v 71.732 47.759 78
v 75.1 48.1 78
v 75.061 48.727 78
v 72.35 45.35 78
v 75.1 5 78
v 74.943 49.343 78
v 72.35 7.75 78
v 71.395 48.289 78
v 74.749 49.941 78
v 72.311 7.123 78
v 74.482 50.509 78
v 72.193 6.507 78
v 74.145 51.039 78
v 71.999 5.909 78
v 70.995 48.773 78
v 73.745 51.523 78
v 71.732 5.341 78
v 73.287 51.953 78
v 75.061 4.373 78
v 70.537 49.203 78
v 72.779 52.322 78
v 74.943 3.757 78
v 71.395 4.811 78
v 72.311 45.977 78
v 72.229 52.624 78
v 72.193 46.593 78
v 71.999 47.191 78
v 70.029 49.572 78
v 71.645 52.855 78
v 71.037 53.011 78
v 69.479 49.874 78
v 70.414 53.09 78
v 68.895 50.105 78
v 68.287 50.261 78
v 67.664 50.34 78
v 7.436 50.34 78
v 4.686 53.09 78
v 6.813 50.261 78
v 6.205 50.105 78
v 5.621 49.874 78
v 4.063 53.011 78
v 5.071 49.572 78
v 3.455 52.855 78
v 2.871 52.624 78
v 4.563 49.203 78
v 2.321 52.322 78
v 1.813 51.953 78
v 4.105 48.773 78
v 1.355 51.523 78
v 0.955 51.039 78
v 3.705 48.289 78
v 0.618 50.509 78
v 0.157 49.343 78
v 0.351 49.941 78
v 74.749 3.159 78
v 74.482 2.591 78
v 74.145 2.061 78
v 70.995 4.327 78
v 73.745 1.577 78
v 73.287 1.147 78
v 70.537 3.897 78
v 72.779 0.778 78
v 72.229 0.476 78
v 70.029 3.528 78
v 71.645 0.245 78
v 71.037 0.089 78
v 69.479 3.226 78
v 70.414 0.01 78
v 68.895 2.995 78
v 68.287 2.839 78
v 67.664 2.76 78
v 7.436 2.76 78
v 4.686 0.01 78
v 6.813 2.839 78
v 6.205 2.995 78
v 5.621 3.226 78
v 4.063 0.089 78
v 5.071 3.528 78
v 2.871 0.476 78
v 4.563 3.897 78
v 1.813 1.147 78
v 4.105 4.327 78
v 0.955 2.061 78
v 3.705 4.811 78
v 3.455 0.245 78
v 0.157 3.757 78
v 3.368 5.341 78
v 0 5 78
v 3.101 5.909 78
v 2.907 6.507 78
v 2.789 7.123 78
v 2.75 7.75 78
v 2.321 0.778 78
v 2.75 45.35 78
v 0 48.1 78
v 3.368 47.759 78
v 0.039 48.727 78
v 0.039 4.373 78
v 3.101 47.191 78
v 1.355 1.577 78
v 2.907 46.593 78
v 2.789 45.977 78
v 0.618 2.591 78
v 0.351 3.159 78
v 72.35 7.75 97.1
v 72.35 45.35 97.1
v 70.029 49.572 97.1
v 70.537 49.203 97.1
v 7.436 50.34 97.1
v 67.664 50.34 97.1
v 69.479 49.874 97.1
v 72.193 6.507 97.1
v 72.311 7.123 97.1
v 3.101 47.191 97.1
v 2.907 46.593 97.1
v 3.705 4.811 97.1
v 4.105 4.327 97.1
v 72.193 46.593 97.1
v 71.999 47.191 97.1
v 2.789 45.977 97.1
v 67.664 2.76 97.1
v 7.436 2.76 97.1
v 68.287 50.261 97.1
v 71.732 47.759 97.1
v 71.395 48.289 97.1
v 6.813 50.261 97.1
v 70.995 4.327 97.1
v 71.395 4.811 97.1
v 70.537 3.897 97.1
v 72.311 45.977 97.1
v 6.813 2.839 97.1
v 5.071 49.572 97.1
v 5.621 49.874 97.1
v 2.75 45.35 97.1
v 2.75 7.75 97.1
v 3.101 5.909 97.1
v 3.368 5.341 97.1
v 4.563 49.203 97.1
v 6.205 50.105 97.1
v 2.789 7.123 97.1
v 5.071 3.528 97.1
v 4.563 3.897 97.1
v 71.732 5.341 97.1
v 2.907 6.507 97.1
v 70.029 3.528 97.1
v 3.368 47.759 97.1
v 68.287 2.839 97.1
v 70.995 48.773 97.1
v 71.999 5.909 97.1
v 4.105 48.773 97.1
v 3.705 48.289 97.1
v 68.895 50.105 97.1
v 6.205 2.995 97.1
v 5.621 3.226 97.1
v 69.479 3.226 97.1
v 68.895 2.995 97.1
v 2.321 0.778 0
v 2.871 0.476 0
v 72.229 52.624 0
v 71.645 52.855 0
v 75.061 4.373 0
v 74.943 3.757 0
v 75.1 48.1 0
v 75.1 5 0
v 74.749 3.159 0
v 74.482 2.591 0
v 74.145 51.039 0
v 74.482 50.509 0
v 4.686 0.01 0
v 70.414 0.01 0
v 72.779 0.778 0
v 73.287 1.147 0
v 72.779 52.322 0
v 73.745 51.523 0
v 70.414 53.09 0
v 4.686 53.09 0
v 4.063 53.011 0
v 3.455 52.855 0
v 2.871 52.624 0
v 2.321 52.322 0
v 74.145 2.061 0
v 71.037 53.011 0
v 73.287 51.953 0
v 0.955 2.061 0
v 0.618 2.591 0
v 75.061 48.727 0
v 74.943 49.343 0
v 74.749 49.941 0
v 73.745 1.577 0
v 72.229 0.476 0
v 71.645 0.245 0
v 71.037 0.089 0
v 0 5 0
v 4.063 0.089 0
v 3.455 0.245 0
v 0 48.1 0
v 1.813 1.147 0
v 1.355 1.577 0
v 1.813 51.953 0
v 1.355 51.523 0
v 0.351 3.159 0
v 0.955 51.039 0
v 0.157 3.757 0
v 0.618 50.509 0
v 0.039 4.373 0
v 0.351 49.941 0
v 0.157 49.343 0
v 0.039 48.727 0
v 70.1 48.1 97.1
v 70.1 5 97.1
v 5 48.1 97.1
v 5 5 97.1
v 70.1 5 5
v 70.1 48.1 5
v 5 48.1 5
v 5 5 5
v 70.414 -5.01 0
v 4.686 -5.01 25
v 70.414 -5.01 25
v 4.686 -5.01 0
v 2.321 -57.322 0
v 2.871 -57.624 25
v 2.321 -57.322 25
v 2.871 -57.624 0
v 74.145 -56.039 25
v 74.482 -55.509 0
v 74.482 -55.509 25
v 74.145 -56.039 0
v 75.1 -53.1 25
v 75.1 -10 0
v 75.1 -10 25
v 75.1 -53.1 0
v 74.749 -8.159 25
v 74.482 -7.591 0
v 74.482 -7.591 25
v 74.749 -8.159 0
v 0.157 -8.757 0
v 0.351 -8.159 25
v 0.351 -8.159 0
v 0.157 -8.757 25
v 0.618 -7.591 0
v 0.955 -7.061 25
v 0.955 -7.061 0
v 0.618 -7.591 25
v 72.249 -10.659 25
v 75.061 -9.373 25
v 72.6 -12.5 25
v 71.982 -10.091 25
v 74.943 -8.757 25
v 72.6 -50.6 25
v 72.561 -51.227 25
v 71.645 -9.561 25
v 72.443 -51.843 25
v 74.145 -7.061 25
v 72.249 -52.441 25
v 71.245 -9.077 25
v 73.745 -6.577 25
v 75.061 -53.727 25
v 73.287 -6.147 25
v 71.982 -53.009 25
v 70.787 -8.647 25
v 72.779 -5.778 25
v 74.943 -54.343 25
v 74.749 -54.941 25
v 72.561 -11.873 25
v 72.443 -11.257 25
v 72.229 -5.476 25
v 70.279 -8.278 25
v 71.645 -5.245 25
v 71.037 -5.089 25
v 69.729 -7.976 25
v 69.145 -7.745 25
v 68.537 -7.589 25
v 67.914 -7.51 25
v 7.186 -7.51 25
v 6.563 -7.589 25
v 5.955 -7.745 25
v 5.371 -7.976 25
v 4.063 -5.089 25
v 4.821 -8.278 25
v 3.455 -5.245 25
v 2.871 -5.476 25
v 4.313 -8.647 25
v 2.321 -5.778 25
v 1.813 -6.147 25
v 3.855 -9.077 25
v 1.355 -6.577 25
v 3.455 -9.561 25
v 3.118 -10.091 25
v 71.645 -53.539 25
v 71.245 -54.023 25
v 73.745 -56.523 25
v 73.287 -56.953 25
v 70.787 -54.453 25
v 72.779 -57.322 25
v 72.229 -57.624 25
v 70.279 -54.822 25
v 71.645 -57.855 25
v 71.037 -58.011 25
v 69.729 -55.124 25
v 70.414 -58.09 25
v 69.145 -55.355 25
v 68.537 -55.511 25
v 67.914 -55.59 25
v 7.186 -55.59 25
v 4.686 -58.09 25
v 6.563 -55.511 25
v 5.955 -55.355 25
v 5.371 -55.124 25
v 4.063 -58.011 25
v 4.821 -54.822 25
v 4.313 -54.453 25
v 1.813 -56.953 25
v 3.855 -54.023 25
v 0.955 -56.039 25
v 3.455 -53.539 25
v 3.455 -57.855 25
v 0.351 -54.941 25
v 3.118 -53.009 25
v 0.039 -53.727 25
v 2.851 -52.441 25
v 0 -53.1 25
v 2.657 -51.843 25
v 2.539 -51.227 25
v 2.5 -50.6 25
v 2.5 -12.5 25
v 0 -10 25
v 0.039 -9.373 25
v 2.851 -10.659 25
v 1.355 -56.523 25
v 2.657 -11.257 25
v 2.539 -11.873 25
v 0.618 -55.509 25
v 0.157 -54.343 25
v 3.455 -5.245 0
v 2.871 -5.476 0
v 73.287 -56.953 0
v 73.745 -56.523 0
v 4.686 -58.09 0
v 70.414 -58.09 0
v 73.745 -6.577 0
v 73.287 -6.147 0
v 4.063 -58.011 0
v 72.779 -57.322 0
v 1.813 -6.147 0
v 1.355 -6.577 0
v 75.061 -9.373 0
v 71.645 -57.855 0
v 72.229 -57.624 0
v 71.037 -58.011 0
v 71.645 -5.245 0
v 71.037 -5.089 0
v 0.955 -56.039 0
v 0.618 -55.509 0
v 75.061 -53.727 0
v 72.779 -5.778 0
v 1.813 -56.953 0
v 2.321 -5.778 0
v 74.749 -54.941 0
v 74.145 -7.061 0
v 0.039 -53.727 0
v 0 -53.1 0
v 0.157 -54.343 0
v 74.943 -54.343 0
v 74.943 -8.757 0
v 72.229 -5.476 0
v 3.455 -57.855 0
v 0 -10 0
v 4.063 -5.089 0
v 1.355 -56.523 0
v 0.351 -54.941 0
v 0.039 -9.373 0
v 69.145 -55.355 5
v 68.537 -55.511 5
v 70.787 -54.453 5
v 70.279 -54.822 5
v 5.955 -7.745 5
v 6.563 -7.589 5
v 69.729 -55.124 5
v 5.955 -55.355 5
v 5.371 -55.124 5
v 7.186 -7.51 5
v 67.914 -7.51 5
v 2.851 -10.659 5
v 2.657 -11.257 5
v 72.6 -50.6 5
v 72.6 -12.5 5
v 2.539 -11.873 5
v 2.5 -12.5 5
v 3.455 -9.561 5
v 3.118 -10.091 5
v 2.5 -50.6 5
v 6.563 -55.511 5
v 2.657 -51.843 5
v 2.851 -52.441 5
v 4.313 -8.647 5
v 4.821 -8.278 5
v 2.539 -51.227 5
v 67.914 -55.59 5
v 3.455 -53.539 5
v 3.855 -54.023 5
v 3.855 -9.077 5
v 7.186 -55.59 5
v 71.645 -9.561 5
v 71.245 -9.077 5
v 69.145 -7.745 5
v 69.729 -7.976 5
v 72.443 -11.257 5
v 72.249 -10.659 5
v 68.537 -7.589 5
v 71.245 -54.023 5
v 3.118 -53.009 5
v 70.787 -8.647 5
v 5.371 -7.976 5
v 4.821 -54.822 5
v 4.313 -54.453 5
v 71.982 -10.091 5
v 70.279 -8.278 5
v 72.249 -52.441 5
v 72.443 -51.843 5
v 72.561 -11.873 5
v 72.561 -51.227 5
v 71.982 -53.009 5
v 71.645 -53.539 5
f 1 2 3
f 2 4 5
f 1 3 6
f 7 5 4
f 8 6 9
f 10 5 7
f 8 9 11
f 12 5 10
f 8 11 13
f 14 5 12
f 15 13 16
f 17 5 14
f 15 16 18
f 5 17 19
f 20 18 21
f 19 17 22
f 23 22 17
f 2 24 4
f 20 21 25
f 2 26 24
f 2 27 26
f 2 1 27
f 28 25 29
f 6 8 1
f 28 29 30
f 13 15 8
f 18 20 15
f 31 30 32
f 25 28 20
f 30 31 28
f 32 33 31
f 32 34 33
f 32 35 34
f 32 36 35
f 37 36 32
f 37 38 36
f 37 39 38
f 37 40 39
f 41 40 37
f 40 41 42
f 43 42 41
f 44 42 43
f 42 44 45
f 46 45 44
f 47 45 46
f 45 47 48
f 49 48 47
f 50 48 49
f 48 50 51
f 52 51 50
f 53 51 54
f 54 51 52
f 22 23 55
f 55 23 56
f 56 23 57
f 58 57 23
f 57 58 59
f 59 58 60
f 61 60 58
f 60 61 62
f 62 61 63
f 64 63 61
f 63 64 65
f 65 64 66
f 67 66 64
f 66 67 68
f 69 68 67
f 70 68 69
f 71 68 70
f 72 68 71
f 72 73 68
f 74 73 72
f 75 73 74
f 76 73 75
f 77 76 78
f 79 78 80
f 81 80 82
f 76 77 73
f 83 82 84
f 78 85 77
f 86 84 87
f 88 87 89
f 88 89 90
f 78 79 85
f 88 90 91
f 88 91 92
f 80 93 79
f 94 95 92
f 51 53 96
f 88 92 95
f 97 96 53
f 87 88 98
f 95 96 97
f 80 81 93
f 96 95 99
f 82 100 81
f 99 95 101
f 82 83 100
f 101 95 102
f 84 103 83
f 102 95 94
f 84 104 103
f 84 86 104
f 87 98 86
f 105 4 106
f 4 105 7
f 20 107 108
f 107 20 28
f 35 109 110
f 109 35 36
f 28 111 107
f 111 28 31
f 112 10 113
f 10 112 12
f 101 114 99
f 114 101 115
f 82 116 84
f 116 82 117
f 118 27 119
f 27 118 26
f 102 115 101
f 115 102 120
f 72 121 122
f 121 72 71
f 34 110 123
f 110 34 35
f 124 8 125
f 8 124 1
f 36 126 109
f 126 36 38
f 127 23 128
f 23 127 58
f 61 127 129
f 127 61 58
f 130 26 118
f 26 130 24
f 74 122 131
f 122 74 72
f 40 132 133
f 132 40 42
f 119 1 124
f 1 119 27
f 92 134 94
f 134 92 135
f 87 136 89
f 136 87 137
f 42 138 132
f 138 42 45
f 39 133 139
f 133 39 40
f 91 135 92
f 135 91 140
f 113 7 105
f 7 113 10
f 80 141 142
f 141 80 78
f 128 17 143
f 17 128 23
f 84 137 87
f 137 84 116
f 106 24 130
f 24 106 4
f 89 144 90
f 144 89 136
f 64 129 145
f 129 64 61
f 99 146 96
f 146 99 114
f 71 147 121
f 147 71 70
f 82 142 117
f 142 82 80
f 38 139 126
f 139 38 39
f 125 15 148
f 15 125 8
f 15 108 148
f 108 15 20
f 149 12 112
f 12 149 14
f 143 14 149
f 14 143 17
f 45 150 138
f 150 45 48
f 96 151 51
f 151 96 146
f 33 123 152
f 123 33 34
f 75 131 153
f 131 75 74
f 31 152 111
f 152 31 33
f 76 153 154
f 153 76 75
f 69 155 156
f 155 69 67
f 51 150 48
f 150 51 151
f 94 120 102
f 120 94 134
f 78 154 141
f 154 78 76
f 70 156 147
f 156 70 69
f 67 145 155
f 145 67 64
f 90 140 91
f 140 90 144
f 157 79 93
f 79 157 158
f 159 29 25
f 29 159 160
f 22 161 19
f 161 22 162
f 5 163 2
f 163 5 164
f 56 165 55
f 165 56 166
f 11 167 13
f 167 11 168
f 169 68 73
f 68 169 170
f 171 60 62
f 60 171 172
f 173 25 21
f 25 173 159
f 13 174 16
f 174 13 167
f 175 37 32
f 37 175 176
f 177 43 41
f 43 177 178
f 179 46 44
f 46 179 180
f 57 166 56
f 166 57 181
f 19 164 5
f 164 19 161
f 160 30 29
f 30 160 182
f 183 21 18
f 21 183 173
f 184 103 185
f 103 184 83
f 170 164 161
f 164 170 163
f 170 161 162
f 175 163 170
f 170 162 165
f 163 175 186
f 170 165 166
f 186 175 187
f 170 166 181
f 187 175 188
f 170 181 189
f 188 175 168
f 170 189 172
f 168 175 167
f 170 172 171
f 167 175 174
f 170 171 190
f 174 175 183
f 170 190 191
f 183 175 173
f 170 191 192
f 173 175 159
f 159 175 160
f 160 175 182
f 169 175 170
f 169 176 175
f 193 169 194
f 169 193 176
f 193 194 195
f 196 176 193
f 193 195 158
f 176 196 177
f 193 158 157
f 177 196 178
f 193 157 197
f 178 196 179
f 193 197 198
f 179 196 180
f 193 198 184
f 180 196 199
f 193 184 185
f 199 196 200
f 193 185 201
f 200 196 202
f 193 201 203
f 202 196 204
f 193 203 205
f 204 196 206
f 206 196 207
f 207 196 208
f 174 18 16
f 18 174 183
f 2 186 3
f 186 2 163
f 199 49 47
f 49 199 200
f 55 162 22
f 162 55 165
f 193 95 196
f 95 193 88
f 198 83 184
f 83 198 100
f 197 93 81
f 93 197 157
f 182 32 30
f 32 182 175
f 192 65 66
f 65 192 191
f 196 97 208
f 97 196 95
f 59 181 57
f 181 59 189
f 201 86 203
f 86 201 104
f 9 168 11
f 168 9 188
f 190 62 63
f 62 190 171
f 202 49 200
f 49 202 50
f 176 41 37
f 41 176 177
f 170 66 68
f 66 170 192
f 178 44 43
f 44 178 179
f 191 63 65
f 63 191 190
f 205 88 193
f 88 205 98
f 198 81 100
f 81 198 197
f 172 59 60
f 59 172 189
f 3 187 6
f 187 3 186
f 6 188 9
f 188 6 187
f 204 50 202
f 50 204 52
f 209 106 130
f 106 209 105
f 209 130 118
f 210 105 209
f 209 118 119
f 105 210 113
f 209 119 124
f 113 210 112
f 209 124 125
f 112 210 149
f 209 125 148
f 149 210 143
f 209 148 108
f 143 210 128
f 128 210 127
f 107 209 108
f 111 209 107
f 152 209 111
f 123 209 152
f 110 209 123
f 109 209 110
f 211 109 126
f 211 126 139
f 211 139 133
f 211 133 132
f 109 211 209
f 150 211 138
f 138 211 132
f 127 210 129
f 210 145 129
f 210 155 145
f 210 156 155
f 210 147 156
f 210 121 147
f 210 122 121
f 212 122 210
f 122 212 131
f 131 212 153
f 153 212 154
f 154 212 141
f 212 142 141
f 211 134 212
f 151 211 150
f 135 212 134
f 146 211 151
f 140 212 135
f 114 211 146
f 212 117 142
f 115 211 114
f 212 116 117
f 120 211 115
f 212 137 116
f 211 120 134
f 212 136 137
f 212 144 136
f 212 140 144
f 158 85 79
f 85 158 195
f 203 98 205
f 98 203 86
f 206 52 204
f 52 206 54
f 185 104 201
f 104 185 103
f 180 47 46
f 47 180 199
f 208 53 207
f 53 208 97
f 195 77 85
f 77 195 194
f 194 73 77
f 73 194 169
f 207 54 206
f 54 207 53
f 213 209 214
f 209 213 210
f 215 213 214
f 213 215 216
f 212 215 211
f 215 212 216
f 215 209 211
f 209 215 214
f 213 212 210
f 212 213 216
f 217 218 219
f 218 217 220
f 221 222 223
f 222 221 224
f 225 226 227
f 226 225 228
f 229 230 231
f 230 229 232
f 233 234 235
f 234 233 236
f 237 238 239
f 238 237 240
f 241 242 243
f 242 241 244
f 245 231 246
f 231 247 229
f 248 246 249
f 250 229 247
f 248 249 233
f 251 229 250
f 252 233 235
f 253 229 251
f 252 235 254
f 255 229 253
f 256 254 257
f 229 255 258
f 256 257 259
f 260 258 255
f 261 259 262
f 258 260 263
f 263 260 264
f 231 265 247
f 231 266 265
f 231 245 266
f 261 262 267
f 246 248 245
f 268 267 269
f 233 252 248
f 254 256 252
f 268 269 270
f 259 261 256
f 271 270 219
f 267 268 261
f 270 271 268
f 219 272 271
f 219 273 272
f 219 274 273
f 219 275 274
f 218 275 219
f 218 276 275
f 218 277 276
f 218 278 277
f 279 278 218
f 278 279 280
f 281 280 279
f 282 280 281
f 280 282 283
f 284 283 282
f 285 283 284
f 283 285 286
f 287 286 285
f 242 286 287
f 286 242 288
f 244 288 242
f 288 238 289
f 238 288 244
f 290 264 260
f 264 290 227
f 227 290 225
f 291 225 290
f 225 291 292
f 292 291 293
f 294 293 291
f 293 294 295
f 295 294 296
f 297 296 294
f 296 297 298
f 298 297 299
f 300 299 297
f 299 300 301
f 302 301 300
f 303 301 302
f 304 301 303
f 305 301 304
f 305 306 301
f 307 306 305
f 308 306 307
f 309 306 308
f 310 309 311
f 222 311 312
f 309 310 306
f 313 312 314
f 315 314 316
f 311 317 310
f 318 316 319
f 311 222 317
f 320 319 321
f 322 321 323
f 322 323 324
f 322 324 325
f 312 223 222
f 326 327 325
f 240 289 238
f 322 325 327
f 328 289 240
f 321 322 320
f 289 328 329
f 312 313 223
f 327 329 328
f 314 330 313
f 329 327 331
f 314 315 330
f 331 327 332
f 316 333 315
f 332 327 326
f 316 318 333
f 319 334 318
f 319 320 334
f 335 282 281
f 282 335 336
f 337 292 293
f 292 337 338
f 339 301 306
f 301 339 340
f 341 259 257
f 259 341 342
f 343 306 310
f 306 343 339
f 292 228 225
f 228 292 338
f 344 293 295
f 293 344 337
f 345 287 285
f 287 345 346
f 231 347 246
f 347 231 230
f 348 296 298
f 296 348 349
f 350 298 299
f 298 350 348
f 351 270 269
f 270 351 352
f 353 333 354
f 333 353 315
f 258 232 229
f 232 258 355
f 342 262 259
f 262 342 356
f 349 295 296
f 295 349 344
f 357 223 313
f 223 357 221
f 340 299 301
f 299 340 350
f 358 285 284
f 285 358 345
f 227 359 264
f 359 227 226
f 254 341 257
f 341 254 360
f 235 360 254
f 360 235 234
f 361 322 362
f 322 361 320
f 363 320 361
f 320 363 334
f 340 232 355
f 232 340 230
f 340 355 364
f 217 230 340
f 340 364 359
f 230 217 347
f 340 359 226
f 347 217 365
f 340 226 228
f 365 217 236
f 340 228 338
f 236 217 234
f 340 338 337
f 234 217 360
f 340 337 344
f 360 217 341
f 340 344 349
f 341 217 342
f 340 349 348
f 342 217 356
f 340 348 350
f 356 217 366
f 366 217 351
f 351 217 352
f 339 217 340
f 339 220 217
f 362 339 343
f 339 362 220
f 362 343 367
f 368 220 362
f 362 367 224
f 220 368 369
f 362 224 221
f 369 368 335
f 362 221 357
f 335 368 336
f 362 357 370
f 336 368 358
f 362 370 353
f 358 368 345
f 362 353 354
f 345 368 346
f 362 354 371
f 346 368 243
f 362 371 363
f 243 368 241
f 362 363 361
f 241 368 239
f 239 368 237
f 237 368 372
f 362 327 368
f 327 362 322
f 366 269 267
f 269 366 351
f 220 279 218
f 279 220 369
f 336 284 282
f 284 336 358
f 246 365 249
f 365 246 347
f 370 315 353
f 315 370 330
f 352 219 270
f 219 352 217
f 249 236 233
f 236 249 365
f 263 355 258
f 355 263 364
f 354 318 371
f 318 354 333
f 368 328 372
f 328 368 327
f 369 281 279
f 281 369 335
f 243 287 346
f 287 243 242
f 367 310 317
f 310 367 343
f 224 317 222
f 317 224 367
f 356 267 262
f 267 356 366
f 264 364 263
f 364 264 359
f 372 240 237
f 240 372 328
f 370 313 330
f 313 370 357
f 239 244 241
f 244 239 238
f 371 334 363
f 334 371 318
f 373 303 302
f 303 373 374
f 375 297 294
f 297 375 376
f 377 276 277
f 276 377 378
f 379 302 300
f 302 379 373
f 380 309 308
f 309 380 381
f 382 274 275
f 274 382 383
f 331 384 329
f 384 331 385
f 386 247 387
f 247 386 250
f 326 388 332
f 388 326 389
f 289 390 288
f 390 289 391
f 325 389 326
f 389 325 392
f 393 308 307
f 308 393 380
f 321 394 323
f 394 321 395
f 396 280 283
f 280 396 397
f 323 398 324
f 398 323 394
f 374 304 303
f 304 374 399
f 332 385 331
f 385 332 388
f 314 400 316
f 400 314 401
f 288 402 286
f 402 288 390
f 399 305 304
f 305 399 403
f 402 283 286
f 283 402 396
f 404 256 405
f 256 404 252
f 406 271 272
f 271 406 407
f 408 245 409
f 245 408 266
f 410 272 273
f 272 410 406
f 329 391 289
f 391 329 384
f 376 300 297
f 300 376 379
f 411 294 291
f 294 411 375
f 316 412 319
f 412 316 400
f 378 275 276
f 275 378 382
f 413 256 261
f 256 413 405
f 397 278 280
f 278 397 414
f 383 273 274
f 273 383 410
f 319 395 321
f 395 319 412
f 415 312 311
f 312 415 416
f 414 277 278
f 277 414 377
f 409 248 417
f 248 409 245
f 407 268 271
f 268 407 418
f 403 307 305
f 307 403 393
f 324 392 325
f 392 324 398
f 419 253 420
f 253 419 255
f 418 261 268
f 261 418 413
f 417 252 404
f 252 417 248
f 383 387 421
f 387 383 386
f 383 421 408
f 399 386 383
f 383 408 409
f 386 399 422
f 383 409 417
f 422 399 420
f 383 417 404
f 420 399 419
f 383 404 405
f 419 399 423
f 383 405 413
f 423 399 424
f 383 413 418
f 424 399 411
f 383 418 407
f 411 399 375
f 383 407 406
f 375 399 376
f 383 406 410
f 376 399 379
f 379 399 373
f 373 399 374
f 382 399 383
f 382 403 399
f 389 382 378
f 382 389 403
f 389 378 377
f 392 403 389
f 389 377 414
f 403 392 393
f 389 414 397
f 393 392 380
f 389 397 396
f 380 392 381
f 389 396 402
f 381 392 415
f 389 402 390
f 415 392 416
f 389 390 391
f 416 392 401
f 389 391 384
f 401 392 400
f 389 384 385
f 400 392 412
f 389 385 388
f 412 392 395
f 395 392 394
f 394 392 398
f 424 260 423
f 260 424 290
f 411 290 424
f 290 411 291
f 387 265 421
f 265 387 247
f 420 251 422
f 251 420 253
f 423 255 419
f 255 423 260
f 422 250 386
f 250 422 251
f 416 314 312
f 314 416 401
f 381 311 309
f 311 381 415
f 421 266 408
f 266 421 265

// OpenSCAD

/* [Configurations] */
Object_Height = 92;
Object_Width = 65;
Object_Depth = 43;
Wall_Tickness = 5;// 5mm is good enough
Cover_Height = 25;

/* [hidden] */
$fn = 50;
Tolerance = 0.1;
Cover_Spacing = 0.5;
Rounded_Corner = 5;


caixa();
translate([0 ,-5 ,Cover_Height]) rotate([180,0,0])  tampa(0);

module caixa(){
    difference(){
    roundedcube(Object_Width + Tolerance + (Wall_Tickness * 2), Object_Depth + Tolerance + (Wall_Tickness * 2), Object_Height + Tolerance + Wall_Tickness, Rounded_Corner,Rounded_Corner,Rounded_Corner,Rounded_Corner);
    translate([Wall_Tickness, Wall_Tickness, Wall_Tickness]) cube([Object_Width + Tolerance, Object_Depth + Tolerance, Object_Height + Tolerance + 1]);
    // Recorte da tampa
    translate([0,-0,(Object_Height + 1) - Cover_Height + (Wall_Tickness * 2)]) tampa(Cover_Spacing);    
    }
    
}

module simbolo(rotation){
    union()
	{
		rotate([90,0,rotation]) resize([larguraLogo,alturaLogo,profundidadeLogo]) import("logo.stl");
	}
}

module tampa(folga){
    difference(){
    translate([-folga/2,-folga/2,0]) roundedcube(Object_Width + Tolerance + (Wall_Tickness * 2) + folga, Object_Depth + Tolerance + (Wall_Tickness * 2) + folga, Cover_Height, Rounded_Corner,Rounded_Corner,Rounded_Corner,Rounded_Corner);
    translate([(Wall_Tickness + folga)/2, (Wall_Tickness + folga) /2, -Wall_Tickness]) roundedcube(Object_Width + Tolerance + Wall_Tickness - folga, Object_Depth + Tolerance +Wall_Tickness - folga, Cover_Height , Rounded_Corner, Rounded_Corner, Rounded_Corner, Rounded_Corner);
    }
}

module cartas(){
#cube([Object_Width, Object_Depth, Object_Height]);
}

module roundedcube(xdim ,ydim ,zdim,rdim1, rdim2, rdim3, rdim4){
    hull(){
        translate([rdim1,rdim1,0]) cylinder(r=rdim1, h=zdim);
        translate([xdim-rdim2,rdim2,0]) cylinder(r=rdim2, h=zdim);

        translate([rdim3,ydim-rdim3,0]) cylinder(r=rdim3, h=zdim);
        translate([xdim-rdim4,ydim-rdim4,0]) cylinder(r=rdim4, h=zdim);
    }
}

